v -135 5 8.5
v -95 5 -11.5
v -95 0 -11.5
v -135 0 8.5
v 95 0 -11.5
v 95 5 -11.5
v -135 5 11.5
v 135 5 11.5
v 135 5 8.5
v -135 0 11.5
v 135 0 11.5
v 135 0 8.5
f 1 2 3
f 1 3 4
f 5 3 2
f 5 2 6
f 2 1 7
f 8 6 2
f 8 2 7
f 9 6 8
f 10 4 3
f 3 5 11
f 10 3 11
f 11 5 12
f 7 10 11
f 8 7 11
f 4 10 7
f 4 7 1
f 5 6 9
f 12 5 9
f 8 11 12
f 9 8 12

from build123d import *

# Parameters (mm, degrees)
ESQUISSE1_W             = 270
ESQUISSE1_H             = 23
BOSS_EXTRU_1_DEPTH      = 5
ENL_V_MAT_EXTRU_1_DEPTH = 10
ENL_V_MAT_EXTRU_2_DEPTH = 10


with BuildPart() as part:
    # Esquisse1 → Boss.-Extru.1 (new body)
    with BuildSketch(Plane(origin=(0, 0, 0), x_dir=(1, 0, 0), z_dir=(0, 1, 0))):
        Rectangle(ESQUISSE1_W, ESQUISSE1_H)
    extrude(amount=BOSS_EXTRU_1_DEPTH)

    # Esquisse3 → Enlèv. mat.-Extru.1 (cut)
    with BuildSketch(Plane(origin=(0, 5, 0), x_dir=(1, 0, 0), z_dir=(0, 1, 0))):
        Polygon((135, -8.5), (135, 11.5), (95, 11.5), align=None)
    extrude(amount=-ENL_V_MAT_EXTRU_1_DEPTH, mode=Mode.SUBTRACT)

    # Esquisse5 → Enlèv. mat.-Extru.2 (cut)
    with BuildSketch(Plane(origin=(0, 5, 0), x_dir=(1, 0, 0), z_dir=(0, 1, 0))):
        Polygon((-135, 11.5), (-95, 11.5), (-135, -8.5), align=None)
    extrude(amount=-ENL_V_MAT_EXTRU_2_DEPTH, mode=Mode.SUBTRACT)


solid = part.part
